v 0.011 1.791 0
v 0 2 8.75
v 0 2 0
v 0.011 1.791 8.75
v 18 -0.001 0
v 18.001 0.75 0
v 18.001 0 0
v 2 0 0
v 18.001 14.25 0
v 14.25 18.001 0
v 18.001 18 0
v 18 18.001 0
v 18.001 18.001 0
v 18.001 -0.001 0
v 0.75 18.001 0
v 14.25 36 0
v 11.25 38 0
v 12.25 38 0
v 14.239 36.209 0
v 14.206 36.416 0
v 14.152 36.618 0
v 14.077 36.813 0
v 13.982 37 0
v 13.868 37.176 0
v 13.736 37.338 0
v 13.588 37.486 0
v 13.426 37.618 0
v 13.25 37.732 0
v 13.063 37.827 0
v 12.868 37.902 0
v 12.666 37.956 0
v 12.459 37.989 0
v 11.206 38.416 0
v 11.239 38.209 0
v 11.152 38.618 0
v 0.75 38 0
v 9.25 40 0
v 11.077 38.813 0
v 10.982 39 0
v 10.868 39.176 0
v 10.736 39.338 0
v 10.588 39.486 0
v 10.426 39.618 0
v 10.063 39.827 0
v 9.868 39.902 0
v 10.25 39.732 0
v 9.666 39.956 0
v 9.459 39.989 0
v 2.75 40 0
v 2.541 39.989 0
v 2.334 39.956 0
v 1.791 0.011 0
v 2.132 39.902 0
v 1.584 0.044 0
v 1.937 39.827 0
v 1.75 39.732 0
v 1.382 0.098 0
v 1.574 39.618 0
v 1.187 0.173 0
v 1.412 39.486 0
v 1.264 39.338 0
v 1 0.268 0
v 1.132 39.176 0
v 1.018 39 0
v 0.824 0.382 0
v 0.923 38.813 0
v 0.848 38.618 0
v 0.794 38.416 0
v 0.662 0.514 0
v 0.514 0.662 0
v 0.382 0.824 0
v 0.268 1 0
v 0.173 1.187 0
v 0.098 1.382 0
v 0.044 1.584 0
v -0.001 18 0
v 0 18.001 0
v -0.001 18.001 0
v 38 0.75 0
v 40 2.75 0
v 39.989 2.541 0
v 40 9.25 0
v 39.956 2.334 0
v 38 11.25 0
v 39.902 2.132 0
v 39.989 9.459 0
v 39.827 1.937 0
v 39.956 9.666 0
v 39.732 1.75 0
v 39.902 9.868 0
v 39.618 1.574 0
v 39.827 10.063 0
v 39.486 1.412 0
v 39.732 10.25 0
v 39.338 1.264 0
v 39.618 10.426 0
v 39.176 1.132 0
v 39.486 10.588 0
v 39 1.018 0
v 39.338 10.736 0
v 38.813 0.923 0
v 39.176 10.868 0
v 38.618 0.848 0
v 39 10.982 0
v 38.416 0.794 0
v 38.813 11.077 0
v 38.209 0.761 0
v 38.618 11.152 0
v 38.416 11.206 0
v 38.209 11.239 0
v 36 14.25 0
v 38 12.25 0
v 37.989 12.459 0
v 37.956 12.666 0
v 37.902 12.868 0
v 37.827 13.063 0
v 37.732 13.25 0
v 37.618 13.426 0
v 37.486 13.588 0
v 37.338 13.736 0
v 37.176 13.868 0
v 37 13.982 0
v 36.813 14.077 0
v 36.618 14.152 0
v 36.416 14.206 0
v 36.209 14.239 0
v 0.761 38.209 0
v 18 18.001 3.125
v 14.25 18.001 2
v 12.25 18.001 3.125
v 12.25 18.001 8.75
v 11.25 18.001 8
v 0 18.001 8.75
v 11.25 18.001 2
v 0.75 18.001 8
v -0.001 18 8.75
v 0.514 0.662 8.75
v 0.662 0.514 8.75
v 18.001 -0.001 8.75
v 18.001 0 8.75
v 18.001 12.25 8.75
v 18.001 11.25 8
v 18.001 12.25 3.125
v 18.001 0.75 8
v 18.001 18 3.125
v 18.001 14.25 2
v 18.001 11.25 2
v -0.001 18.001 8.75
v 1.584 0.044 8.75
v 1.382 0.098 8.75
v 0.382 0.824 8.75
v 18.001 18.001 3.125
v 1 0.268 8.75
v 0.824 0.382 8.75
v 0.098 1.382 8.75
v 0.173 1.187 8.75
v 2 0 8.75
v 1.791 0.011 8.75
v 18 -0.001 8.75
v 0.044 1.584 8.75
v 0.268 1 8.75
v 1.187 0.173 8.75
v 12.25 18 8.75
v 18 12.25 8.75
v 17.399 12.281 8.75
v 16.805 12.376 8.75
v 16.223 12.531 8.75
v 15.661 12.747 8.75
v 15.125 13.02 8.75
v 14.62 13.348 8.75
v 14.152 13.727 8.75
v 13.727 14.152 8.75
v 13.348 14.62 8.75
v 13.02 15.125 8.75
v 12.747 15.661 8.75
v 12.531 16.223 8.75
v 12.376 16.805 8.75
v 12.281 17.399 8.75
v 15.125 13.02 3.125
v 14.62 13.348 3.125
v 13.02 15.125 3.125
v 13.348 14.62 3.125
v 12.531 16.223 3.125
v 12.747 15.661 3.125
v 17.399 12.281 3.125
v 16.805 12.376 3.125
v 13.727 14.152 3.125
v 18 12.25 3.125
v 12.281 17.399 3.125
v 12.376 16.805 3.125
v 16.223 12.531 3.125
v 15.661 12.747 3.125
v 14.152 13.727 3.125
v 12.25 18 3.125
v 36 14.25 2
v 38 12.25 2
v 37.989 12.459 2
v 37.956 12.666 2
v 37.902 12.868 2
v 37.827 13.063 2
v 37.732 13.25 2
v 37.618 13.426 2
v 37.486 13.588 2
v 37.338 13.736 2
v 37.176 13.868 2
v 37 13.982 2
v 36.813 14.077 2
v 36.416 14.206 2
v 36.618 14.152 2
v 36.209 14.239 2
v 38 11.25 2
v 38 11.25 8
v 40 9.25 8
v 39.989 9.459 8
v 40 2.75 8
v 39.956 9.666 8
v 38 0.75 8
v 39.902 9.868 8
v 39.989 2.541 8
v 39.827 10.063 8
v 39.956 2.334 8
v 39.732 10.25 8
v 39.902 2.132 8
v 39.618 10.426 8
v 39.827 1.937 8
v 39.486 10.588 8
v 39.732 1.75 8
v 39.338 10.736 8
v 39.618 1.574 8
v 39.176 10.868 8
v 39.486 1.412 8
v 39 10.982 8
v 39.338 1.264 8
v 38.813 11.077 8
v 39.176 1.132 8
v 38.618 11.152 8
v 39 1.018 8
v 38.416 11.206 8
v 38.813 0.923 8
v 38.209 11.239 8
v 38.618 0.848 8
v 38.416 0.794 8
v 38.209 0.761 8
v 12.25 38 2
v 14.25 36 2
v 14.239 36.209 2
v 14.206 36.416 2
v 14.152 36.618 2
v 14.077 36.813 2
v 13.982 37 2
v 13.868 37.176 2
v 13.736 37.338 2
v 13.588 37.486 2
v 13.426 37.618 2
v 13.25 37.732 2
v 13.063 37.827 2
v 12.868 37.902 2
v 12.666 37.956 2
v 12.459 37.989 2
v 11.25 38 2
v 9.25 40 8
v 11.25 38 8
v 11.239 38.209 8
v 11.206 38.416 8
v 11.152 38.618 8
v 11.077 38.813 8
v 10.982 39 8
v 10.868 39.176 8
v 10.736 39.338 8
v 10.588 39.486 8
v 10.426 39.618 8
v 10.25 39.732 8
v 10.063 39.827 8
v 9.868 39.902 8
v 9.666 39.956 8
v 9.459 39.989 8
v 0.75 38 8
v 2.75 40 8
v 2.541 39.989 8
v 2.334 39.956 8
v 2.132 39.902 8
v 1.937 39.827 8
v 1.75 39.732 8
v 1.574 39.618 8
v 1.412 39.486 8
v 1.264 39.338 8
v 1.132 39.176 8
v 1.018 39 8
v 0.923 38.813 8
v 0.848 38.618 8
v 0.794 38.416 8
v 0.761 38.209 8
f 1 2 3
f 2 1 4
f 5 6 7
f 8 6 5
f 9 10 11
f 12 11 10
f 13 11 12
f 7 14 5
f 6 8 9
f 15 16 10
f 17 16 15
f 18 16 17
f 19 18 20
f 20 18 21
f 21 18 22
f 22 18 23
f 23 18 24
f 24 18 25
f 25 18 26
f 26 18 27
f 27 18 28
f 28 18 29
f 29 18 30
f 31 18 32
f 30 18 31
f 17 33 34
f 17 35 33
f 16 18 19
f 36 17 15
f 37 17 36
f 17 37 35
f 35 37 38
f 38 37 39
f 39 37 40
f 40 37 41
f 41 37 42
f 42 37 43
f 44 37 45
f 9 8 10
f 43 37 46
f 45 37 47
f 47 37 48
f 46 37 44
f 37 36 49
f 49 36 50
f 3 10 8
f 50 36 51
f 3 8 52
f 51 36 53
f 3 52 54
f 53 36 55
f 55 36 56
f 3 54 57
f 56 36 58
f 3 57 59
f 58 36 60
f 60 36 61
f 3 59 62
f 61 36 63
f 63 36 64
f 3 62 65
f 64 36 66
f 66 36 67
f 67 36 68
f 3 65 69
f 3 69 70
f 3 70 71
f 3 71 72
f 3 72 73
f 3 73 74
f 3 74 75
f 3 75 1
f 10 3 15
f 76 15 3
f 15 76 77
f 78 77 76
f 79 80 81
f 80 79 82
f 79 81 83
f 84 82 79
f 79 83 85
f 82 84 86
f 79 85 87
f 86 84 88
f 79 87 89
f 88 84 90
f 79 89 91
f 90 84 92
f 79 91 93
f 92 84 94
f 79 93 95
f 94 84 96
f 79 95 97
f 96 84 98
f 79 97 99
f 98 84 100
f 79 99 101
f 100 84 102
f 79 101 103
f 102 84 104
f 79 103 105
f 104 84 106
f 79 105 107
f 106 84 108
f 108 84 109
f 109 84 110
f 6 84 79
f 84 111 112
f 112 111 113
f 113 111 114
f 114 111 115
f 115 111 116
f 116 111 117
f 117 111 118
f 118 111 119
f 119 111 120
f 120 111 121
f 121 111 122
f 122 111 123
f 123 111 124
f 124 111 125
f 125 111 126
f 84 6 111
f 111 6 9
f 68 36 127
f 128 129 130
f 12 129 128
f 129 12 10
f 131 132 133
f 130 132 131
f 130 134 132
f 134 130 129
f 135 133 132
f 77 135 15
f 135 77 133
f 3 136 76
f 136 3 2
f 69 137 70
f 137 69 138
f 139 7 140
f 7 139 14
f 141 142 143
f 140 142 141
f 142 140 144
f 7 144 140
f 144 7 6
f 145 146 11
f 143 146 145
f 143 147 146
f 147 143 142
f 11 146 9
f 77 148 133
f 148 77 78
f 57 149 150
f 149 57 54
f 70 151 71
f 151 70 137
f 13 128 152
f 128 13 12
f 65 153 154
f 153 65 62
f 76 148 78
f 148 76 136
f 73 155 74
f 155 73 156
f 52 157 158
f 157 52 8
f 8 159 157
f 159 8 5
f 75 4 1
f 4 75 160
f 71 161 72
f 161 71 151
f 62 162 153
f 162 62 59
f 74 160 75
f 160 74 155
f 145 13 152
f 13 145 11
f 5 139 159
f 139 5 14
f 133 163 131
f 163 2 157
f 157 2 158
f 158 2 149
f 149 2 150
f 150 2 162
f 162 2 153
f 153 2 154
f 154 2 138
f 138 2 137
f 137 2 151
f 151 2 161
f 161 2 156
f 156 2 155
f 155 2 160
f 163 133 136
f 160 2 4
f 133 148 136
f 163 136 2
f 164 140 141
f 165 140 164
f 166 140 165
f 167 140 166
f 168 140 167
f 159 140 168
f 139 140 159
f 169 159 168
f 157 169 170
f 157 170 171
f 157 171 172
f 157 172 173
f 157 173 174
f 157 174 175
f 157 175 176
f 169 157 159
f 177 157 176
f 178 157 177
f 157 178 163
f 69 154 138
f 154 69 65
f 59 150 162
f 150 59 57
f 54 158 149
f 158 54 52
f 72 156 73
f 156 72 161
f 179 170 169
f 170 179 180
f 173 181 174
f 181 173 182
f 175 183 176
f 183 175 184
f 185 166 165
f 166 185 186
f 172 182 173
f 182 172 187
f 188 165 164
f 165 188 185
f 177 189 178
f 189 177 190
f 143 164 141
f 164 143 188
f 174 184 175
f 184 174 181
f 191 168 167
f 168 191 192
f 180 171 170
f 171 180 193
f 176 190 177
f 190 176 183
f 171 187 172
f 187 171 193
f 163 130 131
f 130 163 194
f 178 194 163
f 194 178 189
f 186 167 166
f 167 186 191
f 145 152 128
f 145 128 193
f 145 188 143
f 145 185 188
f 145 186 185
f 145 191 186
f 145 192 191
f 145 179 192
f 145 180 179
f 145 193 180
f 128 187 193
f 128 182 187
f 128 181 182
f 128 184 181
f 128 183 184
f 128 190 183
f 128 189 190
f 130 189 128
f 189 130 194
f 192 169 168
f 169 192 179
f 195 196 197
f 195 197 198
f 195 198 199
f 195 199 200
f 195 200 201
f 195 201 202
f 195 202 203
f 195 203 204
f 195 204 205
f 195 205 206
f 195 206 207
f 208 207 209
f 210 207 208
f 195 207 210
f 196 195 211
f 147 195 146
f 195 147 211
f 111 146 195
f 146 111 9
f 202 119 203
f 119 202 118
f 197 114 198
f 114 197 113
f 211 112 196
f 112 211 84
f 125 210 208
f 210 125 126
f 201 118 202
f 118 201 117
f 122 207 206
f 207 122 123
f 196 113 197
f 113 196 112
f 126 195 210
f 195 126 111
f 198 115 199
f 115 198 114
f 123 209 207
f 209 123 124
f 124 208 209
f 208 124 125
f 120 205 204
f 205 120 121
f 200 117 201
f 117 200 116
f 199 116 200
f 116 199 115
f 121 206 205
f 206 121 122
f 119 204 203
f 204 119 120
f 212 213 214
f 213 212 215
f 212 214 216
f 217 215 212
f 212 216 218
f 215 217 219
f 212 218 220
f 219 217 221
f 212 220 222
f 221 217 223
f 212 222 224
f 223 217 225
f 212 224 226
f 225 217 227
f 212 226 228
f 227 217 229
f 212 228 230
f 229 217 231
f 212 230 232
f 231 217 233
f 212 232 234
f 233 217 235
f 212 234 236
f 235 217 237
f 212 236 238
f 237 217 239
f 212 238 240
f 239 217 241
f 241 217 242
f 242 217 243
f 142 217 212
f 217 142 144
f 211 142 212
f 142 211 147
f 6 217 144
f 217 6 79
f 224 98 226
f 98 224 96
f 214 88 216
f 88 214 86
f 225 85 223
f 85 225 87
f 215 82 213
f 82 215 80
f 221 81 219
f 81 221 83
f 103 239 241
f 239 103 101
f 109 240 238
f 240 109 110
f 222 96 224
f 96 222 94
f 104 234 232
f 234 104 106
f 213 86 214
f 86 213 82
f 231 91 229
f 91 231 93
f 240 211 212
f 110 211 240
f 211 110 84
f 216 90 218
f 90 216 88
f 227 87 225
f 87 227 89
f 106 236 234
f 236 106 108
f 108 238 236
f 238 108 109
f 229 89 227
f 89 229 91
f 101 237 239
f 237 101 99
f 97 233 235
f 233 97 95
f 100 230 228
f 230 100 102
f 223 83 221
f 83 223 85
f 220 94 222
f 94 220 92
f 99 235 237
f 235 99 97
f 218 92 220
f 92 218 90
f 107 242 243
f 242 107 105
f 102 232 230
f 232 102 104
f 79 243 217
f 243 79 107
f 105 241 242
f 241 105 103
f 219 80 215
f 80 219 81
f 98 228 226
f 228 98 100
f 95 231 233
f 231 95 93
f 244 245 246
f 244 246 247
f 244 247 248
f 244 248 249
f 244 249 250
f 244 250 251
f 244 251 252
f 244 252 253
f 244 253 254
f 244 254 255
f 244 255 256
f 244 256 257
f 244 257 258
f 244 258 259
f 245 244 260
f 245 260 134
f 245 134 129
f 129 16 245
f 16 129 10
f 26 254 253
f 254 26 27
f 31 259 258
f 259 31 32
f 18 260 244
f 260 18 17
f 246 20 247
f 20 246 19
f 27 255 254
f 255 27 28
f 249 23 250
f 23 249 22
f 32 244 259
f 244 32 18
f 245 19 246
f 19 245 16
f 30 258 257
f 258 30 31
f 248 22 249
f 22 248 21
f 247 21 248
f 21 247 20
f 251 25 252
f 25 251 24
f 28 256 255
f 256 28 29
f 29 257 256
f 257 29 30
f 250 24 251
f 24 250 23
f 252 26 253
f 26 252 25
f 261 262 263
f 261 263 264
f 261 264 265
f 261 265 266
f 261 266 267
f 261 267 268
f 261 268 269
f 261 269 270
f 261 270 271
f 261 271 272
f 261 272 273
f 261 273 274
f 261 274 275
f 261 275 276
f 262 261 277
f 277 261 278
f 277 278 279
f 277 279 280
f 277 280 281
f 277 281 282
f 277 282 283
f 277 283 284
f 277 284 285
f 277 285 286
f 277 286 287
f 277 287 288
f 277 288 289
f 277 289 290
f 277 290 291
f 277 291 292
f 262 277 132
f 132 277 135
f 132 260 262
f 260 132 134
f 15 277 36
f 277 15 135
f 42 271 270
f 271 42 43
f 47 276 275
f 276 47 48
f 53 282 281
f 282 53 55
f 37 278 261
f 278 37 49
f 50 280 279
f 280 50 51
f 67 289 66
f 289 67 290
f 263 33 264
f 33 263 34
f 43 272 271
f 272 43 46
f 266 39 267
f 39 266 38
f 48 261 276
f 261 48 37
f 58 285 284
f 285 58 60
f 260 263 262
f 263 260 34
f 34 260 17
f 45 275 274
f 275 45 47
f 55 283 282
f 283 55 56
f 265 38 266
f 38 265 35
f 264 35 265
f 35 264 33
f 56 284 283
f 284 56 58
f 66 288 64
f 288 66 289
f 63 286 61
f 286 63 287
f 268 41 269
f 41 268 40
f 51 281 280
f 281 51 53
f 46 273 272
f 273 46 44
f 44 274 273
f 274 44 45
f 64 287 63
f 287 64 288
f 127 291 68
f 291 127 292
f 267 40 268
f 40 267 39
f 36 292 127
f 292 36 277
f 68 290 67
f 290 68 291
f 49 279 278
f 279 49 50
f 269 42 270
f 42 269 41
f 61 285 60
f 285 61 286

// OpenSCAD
//corner cube

x=18;

boxheight = 8;
lipwidth=13.5;
lipheight=2.0;
width=10.5;
length= 20;
/* [Hidden] */
y=x;
wall = 0.75;
h=boxheight+wall;
difference(){//cube([x,y,h]);
hull(){

translate([2,2,0])cylinder(r=2,h=h,$fn=60);
translate([x,0,0])cylinder(r=.001,h=h,$fn=60);
translate([x,y,0])cylinder(r=.001,h=h,$fn=60);
translate([0,y,0])cylinder(r=.001,h=h,$fn=60);

}
// cord cutout

translate([x,y,lipheight+1.5*wall])cylinder(r=x-width-wall-1,5*wall,h=h,$fn=60);
}

// arm
arm();
rotate([0,0,-90])mirror() arm();


module arm(){translate([x,wall,0])cube([length,width,h-wall]);
hull(){
   translate([length+x,wall+2,0]) cylinder(r=2,h=h-wall,$fn=60);
   translate([length+x,wall+width-2,0]) cylinder(r=2,h=h-wall,$fn=60);
    }
//lip
    translate([0-2,lipwidth-width,0]){
        
    translate([x,wall,0])cube([length,width,lipheight]);
        hull(){
   translate([length+x,wall+2,0]) cylinder(r=2,h=lipheight,$fn=60);
   translate([length+x,wall+width-2,0]) cylinder(r=2,h=lipheight,$fn=60);
    }
}
}
